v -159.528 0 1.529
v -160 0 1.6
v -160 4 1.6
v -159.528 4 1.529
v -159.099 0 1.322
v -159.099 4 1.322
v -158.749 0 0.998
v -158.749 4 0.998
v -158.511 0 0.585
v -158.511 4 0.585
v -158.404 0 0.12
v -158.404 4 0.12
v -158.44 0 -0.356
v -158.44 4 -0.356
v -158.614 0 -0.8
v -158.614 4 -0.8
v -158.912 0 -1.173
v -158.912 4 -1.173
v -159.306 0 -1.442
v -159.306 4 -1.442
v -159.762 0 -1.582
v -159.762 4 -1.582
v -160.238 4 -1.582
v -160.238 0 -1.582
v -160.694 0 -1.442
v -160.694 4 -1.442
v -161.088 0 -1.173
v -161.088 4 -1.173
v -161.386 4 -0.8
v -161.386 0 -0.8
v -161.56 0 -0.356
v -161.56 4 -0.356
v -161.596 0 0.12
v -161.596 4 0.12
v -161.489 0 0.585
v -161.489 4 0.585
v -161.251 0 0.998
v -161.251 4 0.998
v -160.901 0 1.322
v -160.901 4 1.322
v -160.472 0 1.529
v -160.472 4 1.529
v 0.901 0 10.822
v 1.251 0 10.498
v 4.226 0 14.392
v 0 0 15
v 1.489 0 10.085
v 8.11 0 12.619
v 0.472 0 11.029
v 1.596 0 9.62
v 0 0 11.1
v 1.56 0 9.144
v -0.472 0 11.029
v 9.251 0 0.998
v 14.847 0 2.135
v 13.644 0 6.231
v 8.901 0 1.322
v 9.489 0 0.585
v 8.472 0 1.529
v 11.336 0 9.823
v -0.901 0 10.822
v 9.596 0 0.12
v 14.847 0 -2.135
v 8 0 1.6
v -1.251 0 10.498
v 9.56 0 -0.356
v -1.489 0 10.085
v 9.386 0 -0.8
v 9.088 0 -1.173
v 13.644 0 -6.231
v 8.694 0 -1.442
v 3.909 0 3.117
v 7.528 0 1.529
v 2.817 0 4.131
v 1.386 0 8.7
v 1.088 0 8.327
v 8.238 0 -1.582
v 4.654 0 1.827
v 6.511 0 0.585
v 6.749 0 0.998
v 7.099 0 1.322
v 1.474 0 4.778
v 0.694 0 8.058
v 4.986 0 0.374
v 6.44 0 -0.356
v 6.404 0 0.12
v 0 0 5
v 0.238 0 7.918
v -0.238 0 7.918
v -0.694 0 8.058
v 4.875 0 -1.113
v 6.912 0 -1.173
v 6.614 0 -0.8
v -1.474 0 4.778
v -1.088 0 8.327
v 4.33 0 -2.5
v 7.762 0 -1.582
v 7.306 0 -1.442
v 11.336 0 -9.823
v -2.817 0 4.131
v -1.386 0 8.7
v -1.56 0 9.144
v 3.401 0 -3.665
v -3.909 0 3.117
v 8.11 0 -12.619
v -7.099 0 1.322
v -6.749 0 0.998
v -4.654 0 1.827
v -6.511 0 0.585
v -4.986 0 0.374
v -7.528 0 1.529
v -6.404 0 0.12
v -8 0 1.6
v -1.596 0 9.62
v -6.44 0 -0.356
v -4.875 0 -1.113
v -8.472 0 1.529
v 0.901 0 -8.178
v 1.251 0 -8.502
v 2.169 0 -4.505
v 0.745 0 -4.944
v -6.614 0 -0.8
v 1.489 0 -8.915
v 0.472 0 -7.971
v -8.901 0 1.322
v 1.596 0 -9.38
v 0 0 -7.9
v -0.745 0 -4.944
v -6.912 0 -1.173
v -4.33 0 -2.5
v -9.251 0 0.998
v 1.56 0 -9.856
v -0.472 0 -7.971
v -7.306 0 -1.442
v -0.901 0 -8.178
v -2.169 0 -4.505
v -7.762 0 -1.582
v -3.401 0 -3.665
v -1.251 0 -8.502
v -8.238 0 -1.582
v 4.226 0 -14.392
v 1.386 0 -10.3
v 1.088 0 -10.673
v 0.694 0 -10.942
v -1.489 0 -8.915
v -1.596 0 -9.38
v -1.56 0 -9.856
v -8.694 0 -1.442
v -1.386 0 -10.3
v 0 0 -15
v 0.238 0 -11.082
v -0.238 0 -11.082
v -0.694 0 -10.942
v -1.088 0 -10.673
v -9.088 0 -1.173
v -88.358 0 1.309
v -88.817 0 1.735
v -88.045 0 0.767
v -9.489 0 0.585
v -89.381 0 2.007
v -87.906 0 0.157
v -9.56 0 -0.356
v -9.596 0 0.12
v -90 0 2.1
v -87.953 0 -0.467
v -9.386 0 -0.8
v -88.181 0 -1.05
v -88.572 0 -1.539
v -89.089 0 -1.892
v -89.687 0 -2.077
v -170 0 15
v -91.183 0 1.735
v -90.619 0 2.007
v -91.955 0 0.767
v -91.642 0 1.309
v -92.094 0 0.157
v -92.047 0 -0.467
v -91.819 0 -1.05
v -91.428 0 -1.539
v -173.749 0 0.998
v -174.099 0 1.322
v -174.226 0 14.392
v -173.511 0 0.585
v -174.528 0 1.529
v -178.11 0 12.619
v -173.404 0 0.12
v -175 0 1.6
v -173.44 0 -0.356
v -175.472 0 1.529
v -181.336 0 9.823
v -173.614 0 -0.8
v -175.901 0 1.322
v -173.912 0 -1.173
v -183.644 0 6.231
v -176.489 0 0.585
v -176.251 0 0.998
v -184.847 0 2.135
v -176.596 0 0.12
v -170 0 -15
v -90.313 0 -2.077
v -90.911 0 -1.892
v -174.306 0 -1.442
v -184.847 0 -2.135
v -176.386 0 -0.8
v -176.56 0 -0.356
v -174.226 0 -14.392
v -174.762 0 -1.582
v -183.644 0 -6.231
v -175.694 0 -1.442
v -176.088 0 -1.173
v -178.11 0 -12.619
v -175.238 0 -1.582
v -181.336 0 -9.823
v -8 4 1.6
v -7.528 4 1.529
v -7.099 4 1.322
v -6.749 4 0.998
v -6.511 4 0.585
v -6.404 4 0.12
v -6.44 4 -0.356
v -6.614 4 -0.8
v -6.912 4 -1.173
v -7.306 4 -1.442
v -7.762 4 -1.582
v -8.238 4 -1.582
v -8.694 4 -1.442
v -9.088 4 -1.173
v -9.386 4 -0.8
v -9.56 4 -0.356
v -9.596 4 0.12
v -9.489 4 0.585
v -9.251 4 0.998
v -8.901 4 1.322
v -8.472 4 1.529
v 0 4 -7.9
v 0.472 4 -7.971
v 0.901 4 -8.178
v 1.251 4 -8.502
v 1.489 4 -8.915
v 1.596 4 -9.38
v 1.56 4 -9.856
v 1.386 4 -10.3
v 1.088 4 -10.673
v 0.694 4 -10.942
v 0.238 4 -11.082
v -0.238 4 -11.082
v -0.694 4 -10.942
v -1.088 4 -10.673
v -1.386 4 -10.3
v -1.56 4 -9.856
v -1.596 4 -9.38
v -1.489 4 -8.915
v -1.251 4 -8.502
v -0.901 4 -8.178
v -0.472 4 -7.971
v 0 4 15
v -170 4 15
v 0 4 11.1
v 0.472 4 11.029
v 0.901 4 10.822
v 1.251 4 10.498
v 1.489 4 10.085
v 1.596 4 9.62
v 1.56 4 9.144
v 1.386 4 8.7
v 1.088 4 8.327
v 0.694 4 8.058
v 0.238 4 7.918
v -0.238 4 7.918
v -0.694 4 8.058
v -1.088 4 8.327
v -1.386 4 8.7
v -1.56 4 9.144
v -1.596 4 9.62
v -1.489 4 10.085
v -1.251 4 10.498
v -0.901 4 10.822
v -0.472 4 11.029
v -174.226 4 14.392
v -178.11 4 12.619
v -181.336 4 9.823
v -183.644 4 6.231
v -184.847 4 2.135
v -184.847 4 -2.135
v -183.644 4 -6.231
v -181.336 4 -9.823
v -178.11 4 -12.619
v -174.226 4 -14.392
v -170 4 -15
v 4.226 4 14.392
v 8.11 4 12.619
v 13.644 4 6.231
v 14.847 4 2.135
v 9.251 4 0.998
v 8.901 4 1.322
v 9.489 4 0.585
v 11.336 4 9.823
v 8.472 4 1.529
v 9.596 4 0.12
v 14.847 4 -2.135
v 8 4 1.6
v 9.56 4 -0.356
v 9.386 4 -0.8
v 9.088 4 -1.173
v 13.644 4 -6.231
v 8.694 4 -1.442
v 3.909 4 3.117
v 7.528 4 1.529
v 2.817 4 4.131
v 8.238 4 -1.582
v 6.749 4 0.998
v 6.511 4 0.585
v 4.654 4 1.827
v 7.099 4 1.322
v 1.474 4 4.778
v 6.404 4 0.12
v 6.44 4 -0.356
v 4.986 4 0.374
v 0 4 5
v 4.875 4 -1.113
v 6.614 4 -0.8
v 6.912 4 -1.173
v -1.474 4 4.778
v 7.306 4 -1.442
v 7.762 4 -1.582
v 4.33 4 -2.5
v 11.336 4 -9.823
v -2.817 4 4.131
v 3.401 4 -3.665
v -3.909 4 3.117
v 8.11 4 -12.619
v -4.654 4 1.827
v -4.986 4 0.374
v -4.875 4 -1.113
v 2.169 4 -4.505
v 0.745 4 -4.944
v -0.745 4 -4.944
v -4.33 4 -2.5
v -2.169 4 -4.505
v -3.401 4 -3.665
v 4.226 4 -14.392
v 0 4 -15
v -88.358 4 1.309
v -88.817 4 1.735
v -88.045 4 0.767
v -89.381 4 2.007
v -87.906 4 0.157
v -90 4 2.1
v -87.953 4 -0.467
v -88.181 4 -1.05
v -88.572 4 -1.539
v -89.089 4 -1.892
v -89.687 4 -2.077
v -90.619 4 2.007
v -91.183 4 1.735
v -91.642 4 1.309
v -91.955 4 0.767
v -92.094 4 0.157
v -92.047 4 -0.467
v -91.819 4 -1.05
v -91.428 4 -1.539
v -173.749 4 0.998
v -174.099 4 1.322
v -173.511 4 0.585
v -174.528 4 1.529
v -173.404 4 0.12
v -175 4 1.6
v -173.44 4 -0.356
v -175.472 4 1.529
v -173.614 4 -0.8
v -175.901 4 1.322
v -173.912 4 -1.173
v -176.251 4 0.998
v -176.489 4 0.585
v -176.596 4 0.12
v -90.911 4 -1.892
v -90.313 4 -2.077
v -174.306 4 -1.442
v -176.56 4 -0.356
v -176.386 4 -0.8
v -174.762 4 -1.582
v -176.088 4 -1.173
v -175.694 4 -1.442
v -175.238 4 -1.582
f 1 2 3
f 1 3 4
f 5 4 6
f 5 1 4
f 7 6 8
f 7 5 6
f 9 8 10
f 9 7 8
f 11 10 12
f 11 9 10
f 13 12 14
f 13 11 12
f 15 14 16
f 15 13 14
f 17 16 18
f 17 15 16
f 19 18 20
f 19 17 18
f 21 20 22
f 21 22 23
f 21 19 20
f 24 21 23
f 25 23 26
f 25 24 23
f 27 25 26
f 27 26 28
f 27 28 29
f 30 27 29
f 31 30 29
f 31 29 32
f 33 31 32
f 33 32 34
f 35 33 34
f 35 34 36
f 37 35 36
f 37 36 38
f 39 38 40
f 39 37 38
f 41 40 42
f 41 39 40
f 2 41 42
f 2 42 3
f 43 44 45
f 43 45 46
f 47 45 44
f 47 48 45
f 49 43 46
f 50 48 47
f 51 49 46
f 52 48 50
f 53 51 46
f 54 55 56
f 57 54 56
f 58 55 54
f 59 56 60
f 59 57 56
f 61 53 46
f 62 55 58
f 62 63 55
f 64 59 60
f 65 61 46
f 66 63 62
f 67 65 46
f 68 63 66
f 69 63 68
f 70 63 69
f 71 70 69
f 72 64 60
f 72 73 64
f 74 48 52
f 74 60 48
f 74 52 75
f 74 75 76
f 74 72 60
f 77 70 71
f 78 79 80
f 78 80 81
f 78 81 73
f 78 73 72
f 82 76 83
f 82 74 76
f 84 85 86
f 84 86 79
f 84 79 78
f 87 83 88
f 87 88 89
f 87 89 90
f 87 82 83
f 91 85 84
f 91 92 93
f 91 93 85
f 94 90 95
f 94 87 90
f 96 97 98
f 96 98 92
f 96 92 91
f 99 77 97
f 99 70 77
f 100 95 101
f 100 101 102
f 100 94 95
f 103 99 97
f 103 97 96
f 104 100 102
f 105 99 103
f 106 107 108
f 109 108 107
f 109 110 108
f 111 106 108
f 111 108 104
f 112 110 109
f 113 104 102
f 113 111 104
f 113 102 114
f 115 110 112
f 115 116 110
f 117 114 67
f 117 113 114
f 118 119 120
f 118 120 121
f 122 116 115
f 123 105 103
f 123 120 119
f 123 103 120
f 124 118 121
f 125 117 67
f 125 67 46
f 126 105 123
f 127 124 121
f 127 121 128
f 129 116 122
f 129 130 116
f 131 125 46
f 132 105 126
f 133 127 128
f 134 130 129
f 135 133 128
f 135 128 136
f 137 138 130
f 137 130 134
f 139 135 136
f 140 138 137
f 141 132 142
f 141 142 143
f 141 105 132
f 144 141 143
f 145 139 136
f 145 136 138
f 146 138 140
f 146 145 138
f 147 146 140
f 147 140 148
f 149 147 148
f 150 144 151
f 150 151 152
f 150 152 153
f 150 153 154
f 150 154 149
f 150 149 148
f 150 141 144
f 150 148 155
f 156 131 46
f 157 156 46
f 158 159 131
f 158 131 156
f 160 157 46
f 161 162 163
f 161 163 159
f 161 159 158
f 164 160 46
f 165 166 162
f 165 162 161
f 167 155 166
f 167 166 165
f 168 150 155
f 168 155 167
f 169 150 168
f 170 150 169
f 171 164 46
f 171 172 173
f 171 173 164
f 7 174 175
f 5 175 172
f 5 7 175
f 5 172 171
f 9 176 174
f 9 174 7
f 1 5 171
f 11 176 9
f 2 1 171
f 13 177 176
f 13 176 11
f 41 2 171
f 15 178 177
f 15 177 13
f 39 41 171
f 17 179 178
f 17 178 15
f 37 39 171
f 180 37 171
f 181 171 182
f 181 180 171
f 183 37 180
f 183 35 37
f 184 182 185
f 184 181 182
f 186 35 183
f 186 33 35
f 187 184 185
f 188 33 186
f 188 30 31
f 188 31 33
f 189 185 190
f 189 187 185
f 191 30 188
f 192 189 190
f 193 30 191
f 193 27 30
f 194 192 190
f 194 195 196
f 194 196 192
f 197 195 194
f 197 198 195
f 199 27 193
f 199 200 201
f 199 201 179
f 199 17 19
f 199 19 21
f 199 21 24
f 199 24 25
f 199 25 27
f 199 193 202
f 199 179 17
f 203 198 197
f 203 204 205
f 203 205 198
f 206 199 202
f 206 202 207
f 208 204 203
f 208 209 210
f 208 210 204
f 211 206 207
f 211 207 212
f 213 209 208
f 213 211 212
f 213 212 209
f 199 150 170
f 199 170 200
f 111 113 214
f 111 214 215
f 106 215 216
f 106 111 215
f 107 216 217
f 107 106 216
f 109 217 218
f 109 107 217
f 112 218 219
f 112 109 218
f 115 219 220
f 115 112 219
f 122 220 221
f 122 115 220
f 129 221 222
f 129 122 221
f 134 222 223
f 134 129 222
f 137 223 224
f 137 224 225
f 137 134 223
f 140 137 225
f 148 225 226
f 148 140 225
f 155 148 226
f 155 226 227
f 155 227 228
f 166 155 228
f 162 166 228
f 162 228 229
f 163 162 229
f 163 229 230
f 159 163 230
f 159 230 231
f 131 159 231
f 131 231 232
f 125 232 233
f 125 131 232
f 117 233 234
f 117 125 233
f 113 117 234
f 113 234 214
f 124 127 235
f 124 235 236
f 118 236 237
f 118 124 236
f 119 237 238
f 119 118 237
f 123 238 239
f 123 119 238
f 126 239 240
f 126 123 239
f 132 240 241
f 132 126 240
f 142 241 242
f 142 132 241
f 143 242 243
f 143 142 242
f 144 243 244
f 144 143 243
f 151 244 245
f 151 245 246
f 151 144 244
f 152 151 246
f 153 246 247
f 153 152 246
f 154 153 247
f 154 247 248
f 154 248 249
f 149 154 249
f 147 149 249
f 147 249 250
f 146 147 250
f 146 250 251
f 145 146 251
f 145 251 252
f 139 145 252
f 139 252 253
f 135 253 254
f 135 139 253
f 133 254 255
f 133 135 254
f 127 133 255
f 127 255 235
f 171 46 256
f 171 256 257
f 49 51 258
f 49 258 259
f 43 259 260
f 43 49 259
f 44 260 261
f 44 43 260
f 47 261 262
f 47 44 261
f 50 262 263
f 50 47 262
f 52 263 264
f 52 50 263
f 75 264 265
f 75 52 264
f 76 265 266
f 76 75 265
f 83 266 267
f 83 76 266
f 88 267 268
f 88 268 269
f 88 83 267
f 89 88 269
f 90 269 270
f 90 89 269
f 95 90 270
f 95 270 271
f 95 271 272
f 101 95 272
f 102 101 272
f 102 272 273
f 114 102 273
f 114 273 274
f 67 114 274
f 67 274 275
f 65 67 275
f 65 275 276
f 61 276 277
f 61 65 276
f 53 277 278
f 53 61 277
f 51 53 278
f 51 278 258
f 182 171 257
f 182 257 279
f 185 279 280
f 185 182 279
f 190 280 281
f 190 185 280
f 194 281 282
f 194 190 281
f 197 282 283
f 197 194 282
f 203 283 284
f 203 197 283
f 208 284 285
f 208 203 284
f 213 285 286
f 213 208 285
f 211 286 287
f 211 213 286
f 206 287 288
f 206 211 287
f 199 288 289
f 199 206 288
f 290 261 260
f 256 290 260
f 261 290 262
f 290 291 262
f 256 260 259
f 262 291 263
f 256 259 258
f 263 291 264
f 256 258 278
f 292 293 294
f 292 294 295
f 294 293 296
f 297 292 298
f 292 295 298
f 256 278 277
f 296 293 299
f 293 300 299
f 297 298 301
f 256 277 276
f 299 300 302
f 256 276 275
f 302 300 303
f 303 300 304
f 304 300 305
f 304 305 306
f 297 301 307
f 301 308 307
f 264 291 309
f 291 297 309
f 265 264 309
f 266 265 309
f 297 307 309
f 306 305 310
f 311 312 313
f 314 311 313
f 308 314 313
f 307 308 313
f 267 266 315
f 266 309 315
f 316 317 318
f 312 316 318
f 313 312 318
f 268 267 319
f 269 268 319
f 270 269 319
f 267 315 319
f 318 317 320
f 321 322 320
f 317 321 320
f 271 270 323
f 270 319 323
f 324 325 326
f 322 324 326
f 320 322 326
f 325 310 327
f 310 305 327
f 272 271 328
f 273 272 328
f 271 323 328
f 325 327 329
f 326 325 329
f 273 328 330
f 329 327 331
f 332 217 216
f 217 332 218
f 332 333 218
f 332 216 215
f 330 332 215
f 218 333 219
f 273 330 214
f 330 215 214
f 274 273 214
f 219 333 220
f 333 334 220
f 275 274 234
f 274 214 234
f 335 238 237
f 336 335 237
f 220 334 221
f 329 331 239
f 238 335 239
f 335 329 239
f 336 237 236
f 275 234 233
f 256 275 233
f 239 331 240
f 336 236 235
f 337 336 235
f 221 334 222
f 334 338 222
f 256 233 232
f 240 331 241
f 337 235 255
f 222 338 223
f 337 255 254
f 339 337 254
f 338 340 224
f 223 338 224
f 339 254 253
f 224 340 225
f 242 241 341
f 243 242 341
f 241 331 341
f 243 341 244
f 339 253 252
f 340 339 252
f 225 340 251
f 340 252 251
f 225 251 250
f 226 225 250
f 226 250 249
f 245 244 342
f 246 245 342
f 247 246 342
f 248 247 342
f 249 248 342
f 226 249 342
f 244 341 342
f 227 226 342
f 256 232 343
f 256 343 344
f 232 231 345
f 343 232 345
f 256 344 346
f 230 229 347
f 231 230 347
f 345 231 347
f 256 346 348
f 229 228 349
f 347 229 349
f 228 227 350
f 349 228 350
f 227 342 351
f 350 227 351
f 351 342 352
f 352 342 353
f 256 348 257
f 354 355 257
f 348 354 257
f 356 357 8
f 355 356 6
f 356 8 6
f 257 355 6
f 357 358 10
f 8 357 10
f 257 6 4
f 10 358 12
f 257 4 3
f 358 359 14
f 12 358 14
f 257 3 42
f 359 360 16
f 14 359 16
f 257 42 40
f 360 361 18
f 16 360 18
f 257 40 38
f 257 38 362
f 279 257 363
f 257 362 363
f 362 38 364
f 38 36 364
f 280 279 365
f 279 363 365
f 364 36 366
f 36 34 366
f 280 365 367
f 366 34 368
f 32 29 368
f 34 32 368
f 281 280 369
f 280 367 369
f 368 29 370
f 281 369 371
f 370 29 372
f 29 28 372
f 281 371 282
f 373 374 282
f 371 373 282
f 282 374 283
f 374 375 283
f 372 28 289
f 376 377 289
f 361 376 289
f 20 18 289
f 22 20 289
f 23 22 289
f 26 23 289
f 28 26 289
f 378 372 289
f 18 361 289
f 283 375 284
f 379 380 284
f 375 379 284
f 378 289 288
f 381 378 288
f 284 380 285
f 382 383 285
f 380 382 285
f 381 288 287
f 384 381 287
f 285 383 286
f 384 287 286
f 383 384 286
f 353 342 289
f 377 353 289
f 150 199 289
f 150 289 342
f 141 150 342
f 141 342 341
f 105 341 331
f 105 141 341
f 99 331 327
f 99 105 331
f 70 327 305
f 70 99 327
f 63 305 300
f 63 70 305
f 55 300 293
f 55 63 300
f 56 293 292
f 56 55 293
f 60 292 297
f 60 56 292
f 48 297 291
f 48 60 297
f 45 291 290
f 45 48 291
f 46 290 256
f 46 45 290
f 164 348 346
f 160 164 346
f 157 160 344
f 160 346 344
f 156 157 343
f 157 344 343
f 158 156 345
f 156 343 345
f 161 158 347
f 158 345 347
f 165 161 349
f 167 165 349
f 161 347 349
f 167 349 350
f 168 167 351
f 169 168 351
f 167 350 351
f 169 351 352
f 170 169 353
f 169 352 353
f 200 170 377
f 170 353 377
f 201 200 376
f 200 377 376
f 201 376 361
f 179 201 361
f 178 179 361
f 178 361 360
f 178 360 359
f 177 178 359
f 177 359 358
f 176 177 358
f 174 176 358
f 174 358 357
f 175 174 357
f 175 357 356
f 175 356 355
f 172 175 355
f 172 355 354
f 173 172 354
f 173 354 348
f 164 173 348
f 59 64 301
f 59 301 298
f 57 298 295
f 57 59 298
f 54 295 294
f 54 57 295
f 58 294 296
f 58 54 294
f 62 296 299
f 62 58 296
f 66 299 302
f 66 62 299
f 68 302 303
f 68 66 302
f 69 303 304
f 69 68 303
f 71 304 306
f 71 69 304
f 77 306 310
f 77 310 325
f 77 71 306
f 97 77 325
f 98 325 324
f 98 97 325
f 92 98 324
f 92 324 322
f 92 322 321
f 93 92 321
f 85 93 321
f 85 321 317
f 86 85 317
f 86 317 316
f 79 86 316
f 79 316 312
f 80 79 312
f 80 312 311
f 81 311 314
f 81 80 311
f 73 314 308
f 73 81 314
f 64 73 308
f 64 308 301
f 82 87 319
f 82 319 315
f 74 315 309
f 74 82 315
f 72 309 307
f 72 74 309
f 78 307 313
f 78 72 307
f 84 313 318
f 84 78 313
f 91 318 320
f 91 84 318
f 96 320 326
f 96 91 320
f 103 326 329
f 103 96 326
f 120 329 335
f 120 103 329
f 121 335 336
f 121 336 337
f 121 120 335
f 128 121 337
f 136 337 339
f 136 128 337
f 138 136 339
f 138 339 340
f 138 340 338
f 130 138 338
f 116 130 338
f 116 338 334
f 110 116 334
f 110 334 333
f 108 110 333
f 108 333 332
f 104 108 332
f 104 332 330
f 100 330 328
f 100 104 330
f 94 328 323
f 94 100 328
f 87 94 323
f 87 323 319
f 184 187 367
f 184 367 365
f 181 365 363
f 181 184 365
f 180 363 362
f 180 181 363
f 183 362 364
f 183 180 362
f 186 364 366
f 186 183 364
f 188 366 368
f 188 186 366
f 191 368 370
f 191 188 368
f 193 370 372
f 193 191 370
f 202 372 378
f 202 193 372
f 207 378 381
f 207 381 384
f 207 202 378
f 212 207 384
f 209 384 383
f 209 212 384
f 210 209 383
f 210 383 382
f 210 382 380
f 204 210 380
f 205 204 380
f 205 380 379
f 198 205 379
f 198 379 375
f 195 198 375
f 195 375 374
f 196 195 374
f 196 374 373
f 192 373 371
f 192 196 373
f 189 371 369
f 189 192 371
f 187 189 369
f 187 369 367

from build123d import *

# Parameters (mm, degrees)
SKETCH2_R           = 5
SKETCH2_R_2         = 1.6
BOSS_EXTRUDE1_DEPTH = 4
SKETCH3_R           = 2.1
CUT_EXTRUDE1_DEPTH  = 186.650208726


with BuildPart() as part:
    # Sketch2 → Boss-Extrude1 (new body)
    with BuildSketch(Plane(origin=(0, 0, 0), x_dir=(1, 0, 0), z_dir=(0, 1, 0))):
        with BuildLine():
            Line((0, -15), (-170, -15))
            ThreePointArc((-170, -15), (-185, 0), (-170, 15))
            Line((-170, 15), (0, 15))
            ThreePointArc((0, 15), (15, 0), (0, -15))
        make_face()
        Circle(SKETCH2_R, mode=Mode.SUBTRACT)
        with Locations((8, 0)):
            Circle(SKETCH2_R_2, mode=Mode.SUBTRACT)
        with Locations((-160, 0)):
            Circle(SKETCH2_R_2, mode=Mode.SUBTRACT)
        with Locations((-175, 0)):
            Circle(SKETCH2_R_2, mode=Mode.SUBTRACT)
        with Locations((0, -9.5)):
            Circle(SKETCH2_R_2, mode=Mode.SUBTRACT)
        with Locations((0, 9.5)):
            Circle(SKETCH2_R_2, mode=Mode.SUBTRACT)
        with Locations((-8, 0)):
            Circle(SKETCH2_R_2, mode=Mode.SUBTRACT)
    extrude(amount=BOSS_EXTRUDE1_DEPTH)

    # Sketch3 → Cut-Extrude1 (cut, through all)
    with BuildSketch(Plane(origin=(0, 4, 0), x_dir=(1, 0, 0), z_dir=(0, 1, 0))):
        with Locations((-90, 0)):
            Circle(SKETCH3_R)
    extrude(amount=-CUT_EXTRUDE1_DEPTH, mode=Mode.SUBTRACT)


solid = part.part
